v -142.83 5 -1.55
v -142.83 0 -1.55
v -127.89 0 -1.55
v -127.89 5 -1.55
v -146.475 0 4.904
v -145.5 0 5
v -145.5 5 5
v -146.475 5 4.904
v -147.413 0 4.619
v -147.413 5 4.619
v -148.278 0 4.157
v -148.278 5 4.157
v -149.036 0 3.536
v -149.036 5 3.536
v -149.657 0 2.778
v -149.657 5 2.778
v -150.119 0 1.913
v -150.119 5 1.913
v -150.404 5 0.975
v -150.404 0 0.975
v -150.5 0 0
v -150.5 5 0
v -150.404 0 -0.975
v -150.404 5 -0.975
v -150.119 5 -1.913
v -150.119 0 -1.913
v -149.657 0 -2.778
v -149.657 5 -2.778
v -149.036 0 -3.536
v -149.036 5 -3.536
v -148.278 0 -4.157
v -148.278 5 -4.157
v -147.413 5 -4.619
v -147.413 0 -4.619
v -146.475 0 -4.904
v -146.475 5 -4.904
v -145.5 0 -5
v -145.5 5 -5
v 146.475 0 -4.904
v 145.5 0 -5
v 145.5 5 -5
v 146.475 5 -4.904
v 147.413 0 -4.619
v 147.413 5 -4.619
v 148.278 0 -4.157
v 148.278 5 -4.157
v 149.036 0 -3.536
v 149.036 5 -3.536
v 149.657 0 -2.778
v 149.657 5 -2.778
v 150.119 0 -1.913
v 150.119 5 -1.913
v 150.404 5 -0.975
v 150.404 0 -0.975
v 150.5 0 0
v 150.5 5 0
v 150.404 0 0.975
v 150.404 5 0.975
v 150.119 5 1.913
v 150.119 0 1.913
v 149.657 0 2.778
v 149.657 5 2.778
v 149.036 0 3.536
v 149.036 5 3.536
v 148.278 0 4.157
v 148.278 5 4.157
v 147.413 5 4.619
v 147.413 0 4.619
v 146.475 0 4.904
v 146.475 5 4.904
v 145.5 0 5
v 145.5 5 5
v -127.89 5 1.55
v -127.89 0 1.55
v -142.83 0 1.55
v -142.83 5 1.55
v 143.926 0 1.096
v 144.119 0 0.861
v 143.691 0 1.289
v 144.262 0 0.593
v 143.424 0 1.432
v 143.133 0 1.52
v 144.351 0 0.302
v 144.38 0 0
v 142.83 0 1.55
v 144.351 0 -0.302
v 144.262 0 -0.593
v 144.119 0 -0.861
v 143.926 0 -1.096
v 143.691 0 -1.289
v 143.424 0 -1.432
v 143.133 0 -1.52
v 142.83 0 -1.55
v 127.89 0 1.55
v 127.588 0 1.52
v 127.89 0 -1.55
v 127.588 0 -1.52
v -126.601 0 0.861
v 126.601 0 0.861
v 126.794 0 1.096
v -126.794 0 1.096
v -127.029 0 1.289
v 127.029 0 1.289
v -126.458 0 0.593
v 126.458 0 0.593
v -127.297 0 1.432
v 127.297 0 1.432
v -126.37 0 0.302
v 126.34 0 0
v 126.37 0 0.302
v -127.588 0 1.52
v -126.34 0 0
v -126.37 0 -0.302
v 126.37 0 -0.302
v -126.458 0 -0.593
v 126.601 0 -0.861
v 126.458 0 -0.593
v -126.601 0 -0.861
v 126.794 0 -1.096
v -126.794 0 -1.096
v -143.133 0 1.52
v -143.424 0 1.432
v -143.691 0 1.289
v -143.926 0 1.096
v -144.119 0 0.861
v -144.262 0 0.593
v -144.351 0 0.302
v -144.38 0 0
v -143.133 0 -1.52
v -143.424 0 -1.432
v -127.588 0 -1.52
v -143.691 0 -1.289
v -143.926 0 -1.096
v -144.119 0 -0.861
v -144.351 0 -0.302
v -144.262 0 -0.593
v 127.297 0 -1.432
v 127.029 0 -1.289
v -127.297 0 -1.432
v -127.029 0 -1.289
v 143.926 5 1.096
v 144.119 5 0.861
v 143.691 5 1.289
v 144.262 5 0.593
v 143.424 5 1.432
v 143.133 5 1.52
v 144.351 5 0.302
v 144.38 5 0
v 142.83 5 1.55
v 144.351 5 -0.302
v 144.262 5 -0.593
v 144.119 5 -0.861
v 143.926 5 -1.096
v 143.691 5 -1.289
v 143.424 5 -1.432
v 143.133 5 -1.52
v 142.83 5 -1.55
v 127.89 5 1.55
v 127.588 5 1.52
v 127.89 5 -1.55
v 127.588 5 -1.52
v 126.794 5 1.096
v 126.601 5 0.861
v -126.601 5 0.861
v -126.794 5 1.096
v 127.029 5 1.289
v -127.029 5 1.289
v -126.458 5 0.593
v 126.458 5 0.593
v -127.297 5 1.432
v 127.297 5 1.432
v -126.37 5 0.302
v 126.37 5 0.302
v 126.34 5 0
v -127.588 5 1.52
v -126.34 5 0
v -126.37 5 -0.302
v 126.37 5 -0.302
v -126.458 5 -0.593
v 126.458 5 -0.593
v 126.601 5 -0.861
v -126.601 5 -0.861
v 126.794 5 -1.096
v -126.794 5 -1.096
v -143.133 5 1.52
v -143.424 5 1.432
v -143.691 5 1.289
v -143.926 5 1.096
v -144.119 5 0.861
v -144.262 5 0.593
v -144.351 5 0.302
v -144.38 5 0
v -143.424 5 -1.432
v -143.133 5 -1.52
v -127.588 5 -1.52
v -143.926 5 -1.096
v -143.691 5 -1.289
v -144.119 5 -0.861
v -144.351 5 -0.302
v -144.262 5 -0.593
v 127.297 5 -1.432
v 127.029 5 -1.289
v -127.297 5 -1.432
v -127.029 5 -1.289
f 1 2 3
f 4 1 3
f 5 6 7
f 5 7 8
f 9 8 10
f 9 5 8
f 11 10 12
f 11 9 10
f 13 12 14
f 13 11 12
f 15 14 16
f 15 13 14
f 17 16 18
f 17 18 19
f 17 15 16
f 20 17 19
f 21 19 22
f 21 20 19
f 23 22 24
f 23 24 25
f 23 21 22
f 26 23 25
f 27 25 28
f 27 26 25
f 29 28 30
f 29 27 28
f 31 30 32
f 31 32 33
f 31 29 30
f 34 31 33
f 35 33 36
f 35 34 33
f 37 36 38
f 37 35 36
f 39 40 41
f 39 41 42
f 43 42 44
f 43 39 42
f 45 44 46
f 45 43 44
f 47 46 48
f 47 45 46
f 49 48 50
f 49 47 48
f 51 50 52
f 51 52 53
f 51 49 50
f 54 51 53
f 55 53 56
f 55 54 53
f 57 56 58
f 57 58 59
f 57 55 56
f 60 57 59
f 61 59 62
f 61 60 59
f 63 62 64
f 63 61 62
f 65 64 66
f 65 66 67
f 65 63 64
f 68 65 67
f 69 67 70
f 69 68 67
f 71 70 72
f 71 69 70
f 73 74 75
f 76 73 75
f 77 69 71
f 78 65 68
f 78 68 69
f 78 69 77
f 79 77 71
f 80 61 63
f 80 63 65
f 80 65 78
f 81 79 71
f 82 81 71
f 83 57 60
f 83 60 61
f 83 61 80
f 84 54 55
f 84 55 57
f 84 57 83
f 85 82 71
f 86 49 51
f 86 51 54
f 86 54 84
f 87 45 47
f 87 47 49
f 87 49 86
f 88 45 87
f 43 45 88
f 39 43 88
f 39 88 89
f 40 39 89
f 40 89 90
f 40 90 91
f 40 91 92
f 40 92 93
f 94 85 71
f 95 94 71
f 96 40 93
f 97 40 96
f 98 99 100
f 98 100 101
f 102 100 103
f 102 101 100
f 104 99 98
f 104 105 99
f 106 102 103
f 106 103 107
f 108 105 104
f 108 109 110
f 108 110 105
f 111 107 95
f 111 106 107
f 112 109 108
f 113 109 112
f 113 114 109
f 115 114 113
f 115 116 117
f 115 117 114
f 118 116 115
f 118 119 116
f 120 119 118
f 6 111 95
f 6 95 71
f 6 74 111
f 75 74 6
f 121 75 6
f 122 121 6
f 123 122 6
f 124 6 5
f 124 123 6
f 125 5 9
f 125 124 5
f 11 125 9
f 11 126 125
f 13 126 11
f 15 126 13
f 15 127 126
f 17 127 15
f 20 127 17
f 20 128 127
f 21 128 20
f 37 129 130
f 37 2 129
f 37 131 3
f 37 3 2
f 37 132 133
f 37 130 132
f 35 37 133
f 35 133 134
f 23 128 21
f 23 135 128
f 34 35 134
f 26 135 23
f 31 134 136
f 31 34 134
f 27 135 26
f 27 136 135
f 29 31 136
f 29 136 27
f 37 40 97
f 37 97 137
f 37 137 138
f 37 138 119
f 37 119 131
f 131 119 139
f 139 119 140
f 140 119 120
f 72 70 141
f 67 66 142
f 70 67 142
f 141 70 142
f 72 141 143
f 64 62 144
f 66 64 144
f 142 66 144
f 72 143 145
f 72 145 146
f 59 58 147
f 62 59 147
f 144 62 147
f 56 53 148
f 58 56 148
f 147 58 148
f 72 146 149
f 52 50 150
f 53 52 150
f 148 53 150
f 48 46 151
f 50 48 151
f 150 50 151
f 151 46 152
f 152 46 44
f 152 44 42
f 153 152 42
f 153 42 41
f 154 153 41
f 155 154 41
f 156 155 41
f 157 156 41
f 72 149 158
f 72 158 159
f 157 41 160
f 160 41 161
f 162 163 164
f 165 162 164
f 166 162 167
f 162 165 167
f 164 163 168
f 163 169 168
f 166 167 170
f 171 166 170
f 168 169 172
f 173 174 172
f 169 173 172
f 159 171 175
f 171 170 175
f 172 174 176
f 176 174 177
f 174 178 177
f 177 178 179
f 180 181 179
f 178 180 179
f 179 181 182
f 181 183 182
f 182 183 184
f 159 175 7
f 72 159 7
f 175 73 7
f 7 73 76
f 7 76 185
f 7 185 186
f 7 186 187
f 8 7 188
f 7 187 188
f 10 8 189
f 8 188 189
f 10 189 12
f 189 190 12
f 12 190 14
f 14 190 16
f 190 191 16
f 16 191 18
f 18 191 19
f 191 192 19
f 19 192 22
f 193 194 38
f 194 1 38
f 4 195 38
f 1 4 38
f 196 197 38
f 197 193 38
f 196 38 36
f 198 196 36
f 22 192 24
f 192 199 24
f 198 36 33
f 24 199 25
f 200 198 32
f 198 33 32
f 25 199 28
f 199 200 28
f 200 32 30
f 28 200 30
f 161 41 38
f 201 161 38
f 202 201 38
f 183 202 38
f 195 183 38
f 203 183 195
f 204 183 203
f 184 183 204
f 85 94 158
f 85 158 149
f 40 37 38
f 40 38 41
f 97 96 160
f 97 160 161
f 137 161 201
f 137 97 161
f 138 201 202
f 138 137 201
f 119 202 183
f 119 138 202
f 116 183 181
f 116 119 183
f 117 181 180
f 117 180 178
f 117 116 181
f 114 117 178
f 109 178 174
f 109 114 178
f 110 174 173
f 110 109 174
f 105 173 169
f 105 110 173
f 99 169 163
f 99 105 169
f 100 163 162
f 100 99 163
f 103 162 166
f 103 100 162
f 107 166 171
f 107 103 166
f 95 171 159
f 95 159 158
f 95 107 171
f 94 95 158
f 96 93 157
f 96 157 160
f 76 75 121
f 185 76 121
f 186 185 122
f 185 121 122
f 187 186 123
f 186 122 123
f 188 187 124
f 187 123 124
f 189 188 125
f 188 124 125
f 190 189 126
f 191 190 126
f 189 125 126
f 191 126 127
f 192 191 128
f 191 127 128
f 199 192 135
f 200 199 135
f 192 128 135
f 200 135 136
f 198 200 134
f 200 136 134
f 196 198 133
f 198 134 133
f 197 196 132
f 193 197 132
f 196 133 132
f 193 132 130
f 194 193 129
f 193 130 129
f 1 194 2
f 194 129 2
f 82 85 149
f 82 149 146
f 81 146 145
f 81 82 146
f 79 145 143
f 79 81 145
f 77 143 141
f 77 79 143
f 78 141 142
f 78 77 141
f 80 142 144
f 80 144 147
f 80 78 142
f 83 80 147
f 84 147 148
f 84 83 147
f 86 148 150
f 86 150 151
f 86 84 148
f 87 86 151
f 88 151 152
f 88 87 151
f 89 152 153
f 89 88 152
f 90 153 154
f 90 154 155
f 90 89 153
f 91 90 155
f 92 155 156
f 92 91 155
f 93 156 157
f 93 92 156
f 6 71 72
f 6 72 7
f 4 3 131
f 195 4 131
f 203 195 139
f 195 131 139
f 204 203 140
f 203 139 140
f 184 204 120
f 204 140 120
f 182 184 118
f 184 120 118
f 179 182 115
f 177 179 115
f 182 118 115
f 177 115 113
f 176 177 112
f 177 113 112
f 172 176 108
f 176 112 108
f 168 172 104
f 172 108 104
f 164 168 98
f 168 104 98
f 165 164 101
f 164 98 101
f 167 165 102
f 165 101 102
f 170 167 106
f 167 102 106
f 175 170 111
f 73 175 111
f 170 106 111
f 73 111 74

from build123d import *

# Parameters (mm, degrees)
EXTRUDE_1_DEPTH = 5


with BuildPart() as part:
    # 草圖1 → 填料-伸長1 (new body)
    with BuildSketch(Plane(origin=(0, 0, 0), x_dir=(1, 0, 0), z_dir=(0, 1, 0))):
        with BuildLine():
            Line((-145.5, 5), (145.5, 5))
            ThreePointArc((145.5, 5), (150.5, 0), (145.5, -5))
            Line((145.5, -5), (-145.5, -5))
            ThreePointArc((-145.5, -5), (-150.5, 0), (-145.5, 5))
        make_face()
        with BuildLine():
            Line((-127.890062181, -1.55), (-142.830345758, -1.55))
            ThreePointArc((-142.830345758, -1.55), (-144.380345758, 0), (-142.830345758, 1.55))
            Line((-142.830345758, 1.55), (-127.890062181, 1.55))
            ThreePointArc((-127.890062181, 1.55), (-126.340062181, 0), (-127.890062181, -1.55))
        make_face(mode=Mode.SUBTRACT)
        with BuildLine():
            Line((127.890062181, -1.55), (142.830345758, -1.55))
            ThreePointArc((142.830345758, -1.55), (144.380345758, 0), (142.830345758, 1.55))
            Line((142.830345758, 1.55), (127.890062181, 1.55))
            ThreePointArc((127.890062181, 1.55), (126.340062181, 0), (127.890062181, -1.55))
        make_face(mode=Mode.SUBTRACT)
    extrude(amount=EXTRUDE_1_DEPTH)


solid = part.part
